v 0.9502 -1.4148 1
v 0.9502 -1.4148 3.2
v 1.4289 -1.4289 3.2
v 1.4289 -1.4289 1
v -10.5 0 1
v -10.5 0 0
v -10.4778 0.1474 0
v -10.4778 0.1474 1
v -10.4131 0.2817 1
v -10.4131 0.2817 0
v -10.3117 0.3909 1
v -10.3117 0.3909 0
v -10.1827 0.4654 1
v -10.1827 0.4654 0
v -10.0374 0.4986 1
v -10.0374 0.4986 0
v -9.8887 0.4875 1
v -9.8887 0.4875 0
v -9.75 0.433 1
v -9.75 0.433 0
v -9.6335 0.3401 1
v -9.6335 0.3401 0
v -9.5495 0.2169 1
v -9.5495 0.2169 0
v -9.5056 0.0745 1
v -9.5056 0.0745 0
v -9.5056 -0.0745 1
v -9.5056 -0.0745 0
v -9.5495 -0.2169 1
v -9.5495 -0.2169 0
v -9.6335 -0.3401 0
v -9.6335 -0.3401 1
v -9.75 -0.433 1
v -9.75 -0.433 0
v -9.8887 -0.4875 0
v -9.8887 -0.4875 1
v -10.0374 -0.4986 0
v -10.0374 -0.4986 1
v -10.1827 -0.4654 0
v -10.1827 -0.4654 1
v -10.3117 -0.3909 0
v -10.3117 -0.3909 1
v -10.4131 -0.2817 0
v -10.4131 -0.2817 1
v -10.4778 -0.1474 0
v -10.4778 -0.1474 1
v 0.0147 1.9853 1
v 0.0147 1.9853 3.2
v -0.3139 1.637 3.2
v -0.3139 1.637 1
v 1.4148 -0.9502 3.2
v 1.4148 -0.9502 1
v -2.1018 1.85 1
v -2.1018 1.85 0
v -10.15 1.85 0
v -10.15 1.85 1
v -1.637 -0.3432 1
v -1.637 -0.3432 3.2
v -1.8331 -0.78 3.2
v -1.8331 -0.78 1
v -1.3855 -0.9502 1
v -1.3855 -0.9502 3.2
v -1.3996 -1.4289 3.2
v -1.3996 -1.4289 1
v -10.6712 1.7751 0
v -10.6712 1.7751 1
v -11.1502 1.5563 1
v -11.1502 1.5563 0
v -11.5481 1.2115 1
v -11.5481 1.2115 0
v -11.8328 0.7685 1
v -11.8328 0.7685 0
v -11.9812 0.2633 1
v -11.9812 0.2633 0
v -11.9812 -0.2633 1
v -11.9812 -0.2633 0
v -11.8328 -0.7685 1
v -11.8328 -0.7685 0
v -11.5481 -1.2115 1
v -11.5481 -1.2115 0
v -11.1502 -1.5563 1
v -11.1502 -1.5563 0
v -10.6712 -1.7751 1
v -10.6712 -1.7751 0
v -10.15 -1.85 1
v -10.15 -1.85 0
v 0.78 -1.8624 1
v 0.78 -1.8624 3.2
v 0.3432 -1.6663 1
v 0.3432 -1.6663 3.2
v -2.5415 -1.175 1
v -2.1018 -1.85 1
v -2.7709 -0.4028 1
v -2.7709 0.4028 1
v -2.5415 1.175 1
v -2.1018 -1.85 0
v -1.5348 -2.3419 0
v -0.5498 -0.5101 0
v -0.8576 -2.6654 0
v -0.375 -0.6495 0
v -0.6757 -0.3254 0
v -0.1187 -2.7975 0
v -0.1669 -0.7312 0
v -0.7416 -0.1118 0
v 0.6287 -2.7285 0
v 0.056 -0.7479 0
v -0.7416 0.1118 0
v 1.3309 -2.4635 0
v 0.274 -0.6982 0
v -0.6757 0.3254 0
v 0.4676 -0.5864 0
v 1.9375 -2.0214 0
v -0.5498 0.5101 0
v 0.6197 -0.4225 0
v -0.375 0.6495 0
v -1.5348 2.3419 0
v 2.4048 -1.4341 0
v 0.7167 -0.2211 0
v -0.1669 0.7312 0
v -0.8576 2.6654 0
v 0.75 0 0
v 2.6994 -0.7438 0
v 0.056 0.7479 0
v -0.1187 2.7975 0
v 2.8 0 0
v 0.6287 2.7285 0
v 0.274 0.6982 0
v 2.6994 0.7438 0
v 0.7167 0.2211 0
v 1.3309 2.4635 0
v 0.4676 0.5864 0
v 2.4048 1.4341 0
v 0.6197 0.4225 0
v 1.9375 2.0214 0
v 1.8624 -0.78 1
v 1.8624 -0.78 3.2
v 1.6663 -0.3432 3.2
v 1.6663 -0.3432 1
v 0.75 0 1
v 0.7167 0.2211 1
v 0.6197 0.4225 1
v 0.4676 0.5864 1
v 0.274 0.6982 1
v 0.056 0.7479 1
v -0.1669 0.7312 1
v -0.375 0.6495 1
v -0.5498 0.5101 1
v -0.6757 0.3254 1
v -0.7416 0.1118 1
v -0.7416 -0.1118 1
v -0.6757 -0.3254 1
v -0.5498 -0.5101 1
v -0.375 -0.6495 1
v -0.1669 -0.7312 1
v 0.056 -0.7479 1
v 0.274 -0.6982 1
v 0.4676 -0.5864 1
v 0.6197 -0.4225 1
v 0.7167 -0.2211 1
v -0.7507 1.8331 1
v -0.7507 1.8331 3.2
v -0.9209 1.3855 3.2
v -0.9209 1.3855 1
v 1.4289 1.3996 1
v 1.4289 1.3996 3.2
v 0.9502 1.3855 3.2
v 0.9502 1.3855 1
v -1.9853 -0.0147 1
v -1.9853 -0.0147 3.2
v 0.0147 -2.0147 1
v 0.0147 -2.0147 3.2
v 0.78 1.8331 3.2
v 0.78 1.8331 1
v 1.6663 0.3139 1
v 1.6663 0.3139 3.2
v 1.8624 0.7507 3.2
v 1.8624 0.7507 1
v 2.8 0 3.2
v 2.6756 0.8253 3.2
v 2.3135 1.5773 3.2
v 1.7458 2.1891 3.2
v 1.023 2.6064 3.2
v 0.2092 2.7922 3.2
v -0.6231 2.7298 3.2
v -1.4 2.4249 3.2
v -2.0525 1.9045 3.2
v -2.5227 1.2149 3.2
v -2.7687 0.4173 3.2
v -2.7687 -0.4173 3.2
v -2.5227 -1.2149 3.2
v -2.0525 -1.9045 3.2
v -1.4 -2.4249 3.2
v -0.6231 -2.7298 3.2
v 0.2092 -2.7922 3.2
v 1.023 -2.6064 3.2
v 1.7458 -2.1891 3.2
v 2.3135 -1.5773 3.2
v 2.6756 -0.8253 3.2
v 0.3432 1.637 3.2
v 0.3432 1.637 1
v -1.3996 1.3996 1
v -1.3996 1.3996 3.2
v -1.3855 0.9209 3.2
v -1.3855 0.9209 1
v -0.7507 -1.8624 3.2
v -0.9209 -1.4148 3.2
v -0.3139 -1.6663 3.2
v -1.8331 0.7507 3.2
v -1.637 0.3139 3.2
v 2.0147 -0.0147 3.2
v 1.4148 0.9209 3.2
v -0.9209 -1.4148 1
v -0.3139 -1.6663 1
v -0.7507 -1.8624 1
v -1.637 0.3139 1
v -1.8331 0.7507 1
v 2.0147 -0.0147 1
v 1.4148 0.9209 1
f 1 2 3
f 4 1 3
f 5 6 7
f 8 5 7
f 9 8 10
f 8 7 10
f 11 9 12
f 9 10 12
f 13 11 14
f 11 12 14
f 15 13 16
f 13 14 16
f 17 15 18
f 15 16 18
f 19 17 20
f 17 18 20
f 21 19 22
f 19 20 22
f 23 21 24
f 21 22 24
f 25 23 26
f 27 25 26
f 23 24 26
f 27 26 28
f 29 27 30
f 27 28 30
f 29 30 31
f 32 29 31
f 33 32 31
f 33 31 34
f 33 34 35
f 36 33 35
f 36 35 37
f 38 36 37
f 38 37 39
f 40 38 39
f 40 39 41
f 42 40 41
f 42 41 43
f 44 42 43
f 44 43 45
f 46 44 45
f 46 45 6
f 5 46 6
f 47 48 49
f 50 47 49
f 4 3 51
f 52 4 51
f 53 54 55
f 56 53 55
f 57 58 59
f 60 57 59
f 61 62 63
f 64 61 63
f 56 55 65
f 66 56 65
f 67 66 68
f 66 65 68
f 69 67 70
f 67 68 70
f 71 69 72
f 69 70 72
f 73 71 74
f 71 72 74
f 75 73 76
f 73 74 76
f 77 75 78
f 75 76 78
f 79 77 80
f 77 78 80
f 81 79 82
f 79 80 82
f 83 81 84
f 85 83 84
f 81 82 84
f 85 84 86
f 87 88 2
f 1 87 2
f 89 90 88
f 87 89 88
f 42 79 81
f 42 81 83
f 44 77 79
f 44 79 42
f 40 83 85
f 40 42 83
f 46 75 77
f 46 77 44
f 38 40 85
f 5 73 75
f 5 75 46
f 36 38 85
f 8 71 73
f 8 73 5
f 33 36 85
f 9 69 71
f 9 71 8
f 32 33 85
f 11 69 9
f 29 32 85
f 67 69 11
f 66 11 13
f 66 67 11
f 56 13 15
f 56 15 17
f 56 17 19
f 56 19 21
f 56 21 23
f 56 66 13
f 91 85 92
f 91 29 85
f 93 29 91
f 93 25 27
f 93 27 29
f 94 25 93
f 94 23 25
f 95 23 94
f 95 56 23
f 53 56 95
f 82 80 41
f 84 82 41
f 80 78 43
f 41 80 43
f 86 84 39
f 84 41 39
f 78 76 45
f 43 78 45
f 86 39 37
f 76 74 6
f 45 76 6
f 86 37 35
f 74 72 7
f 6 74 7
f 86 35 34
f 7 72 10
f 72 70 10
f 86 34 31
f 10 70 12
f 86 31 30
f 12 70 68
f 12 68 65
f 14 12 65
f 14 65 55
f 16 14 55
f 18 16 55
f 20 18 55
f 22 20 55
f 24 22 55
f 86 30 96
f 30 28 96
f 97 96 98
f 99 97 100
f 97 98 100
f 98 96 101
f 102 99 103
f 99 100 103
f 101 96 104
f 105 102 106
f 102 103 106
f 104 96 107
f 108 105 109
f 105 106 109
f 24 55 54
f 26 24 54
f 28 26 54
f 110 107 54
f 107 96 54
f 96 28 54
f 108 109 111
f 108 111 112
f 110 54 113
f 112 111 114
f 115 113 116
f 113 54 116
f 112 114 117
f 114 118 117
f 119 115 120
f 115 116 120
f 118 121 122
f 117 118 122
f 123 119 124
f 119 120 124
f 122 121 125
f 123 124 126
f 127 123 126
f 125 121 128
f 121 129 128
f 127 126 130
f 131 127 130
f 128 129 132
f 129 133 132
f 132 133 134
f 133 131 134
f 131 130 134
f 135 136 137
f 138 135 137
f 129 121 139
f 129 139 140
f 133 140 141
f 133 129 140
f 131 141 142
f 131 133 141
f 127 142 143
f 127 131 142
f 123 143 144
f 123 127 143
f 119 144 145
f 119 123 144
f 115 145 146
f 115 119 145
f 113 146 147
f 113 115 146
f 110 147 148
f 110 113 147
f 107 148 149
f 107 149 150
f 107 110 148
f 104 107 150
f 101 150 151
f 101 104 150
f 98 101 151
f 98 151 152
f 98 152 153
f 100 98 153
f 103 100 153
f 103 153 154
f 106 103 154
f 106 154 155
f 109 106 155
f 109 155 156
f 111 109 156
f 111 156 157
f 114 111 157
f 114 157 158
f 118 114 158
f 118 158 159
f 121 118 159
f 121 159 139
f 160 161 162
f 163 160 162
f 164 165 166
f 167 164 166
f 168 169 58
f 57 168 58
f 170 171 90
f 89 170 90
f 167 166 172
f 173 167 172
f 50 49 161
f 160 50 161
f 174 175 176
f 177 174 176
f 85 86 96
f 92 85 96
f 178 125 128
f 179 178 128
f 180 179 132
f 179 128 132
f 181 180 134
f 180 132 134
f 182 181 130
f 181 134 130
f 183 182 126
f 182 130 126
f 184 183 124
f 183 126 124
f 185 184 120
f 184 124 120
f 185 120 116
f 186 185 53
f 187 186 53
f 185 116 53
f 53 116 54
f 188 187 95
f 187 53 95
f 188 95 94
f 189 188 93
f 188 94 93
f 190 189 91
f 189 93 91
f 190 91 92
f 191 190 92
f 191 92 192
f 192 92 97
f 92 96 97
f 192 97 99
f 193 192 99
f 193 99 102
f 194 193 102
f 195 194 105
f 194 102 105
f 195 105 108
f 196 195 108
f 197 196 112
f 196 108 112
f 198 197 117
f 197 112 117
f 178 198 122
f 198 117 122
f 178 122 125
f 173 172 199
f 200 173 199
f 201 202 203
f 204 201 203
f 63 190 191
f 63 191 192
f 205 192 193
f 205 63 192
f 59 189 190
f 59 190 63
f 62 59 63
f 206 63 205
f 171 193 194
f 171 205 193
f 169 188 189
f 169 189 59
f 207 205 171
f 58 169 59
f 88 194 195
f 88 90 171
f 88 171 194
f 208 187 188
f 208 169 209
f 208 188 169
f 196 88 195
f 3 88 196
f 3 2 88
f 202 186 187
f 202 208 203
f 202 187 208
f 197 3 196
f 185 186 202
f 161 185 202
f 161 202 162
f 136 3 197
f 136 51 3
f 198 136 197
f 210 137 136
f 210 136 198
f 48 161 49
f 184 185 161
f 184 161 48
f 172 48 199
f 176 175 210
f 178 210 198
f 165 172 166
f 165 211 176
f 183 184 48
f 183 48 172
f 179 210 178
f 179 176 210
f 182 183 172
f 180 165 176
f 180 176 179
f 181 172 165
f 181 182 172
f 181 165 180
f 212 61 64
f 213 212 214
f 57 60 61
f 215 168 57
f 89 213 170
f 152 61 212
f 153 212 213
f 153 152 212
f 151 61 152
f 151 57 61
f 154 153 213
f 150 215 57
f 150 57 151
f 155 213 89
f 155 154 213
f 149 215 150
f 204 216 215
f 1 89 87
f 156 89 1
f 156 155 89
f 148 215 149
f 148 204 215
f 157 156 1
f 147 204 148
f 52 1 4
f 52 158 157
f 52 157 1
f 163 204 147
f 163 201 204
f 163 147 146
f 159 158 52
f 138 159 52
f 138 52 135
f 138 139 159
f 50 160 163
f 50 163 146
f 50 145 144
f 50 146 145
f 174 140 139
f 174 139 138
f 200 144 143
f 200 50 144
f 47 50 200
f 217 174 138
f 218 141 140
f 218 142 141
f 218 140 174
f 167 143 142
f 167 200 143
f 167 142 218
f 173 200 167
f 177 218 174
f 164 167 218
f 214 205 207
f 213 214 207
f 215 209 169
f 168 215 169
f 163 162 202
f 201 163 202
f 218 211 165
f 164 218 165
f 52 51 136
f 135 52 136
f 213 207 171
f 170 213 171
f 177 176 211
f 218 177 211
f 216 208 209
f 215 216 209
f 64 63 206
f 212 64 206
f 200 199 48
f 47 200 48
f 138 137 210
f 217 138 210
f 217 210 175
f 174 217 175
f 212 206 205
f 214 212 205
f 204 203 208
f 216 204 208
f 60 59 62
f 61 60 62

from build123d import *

# Parameters (mm, degrees)
SKETCH1_R           = 2.8
BOSS_EXTRUDE1_DEPTH = 3.2
CUT_EXTRUDE1_DEPTH  = 2.2
SKETCH3_R           = 0.75
CUT_EXTRUDE2_DEPTH  = 1
BOSS_EXTRUDE2_DEPTH = 1
CUT_EXTRUDE3_REACH  = 14.731
SKETCH5_R           = 0.5


with BuildPart() as part:
    # Sketch1 → Boss-Extrude1 (new body)
    with BuildSketch(Plane.XY):
        Circle(SKETCH1_R)
    extrude(amount=BOSS_EXTRUDE1_DEPTH)

    # Sketch2 → Cut-Extrude1 (cut)
    with BuildSketch(Plane.XY.offset(3.2)):
        Polygon((0.014651949, 1.985348051), (-0.313876209, 1.636970634), (-0.750714916, 1.833107116), (-0.920917091, 1.385526068), (-1.399561614, 1.399561614), (-1.385526068, 0.920917091), (-1.833107116, 0.750714916), (-1.636970634, 0.313876209), (-1.985348051, -0.014651949), (-1.636970634, -0.343180107), (-1.833107116, -0.780018813), (-1.385526068, -0.950220989), (-1.399561614, -1.428865511), (-0.920917091, -1.414829965), (-0.750714916, -1.862411014), (-0.313876209, -1.666274532), (0.014651949, -2.014651949), (0.343180107, -1.666274532), (0.780018813, -1.862411014), (0.950220989, -1.414829965), (1.428865511, -1.428865511), (1.414829965, -0.950220989), (1.862411014, -0.780018813), (1.666274532, -0.343180107), (2.014651949, -0.014651949), (1.666274532, 0.313876209), (1.862411014, 0.750714916), (1.414829965, 0.920917091), (1.428865511, 1.399561614), (0.950220989, 1.385526068), (0.780018813, 1.833107116), (0.343180107, 1.636970634), align=None)
    extrude(amount=-CUT_EXTRUDE1_DEPTH, mode=Mode.SUBTRACT)

    # Sketch3 → Cut-Extrude2 (cut)
    with BuildSketch(Plane.XY):
        Circle(SKETCH3_R)
    extrude(amount=CUT_EXTRUDE2_DEPTH, mode=Mode.SUBTRACT)

    # Sketch4 → Boss-Extrude2 (add)
    with BuildSketch(Plane.XY):
        with BuildLine():
            Line((-0.75, -1.85), (-0.75, 1.85))
            Line((-0.75, 1.85), (-10.15, 1.85))
            ThreePointArc((-10.15, 1.85), (-12, 0), (-10.15, -1.85))
            Line((-10.15, -1.85), (-0.75, -1.85))
        make_face()
    extrude(amount=BOSS_EXTRUDE2_DEPTH)

    # Sketch5 → Cut-Extrude3 (cut, up to next)
    with BuildSketch(Plane(origin=(0, 0, 0), x_dir=(-1, 0, 0), z_dir=(0, 0, -1)), mode=Mode.PRIVATE) as cut_extrude3_sk1:
        with Locations((10, 0)):
            Circle(SKETCH5_R)
    cut_extrude3_tool1 = extrude(cut_extrude3_sk1.sketch, amount=-CUT_EXTRUDE3_REACH, mode=Mode.PRIVATE) & part.part
    add(cut_extrude3_tool1.solids().sort_by_distance((-10, 0, 0))[0], mode=Mode.SUBTRACT)


solid = part.part
